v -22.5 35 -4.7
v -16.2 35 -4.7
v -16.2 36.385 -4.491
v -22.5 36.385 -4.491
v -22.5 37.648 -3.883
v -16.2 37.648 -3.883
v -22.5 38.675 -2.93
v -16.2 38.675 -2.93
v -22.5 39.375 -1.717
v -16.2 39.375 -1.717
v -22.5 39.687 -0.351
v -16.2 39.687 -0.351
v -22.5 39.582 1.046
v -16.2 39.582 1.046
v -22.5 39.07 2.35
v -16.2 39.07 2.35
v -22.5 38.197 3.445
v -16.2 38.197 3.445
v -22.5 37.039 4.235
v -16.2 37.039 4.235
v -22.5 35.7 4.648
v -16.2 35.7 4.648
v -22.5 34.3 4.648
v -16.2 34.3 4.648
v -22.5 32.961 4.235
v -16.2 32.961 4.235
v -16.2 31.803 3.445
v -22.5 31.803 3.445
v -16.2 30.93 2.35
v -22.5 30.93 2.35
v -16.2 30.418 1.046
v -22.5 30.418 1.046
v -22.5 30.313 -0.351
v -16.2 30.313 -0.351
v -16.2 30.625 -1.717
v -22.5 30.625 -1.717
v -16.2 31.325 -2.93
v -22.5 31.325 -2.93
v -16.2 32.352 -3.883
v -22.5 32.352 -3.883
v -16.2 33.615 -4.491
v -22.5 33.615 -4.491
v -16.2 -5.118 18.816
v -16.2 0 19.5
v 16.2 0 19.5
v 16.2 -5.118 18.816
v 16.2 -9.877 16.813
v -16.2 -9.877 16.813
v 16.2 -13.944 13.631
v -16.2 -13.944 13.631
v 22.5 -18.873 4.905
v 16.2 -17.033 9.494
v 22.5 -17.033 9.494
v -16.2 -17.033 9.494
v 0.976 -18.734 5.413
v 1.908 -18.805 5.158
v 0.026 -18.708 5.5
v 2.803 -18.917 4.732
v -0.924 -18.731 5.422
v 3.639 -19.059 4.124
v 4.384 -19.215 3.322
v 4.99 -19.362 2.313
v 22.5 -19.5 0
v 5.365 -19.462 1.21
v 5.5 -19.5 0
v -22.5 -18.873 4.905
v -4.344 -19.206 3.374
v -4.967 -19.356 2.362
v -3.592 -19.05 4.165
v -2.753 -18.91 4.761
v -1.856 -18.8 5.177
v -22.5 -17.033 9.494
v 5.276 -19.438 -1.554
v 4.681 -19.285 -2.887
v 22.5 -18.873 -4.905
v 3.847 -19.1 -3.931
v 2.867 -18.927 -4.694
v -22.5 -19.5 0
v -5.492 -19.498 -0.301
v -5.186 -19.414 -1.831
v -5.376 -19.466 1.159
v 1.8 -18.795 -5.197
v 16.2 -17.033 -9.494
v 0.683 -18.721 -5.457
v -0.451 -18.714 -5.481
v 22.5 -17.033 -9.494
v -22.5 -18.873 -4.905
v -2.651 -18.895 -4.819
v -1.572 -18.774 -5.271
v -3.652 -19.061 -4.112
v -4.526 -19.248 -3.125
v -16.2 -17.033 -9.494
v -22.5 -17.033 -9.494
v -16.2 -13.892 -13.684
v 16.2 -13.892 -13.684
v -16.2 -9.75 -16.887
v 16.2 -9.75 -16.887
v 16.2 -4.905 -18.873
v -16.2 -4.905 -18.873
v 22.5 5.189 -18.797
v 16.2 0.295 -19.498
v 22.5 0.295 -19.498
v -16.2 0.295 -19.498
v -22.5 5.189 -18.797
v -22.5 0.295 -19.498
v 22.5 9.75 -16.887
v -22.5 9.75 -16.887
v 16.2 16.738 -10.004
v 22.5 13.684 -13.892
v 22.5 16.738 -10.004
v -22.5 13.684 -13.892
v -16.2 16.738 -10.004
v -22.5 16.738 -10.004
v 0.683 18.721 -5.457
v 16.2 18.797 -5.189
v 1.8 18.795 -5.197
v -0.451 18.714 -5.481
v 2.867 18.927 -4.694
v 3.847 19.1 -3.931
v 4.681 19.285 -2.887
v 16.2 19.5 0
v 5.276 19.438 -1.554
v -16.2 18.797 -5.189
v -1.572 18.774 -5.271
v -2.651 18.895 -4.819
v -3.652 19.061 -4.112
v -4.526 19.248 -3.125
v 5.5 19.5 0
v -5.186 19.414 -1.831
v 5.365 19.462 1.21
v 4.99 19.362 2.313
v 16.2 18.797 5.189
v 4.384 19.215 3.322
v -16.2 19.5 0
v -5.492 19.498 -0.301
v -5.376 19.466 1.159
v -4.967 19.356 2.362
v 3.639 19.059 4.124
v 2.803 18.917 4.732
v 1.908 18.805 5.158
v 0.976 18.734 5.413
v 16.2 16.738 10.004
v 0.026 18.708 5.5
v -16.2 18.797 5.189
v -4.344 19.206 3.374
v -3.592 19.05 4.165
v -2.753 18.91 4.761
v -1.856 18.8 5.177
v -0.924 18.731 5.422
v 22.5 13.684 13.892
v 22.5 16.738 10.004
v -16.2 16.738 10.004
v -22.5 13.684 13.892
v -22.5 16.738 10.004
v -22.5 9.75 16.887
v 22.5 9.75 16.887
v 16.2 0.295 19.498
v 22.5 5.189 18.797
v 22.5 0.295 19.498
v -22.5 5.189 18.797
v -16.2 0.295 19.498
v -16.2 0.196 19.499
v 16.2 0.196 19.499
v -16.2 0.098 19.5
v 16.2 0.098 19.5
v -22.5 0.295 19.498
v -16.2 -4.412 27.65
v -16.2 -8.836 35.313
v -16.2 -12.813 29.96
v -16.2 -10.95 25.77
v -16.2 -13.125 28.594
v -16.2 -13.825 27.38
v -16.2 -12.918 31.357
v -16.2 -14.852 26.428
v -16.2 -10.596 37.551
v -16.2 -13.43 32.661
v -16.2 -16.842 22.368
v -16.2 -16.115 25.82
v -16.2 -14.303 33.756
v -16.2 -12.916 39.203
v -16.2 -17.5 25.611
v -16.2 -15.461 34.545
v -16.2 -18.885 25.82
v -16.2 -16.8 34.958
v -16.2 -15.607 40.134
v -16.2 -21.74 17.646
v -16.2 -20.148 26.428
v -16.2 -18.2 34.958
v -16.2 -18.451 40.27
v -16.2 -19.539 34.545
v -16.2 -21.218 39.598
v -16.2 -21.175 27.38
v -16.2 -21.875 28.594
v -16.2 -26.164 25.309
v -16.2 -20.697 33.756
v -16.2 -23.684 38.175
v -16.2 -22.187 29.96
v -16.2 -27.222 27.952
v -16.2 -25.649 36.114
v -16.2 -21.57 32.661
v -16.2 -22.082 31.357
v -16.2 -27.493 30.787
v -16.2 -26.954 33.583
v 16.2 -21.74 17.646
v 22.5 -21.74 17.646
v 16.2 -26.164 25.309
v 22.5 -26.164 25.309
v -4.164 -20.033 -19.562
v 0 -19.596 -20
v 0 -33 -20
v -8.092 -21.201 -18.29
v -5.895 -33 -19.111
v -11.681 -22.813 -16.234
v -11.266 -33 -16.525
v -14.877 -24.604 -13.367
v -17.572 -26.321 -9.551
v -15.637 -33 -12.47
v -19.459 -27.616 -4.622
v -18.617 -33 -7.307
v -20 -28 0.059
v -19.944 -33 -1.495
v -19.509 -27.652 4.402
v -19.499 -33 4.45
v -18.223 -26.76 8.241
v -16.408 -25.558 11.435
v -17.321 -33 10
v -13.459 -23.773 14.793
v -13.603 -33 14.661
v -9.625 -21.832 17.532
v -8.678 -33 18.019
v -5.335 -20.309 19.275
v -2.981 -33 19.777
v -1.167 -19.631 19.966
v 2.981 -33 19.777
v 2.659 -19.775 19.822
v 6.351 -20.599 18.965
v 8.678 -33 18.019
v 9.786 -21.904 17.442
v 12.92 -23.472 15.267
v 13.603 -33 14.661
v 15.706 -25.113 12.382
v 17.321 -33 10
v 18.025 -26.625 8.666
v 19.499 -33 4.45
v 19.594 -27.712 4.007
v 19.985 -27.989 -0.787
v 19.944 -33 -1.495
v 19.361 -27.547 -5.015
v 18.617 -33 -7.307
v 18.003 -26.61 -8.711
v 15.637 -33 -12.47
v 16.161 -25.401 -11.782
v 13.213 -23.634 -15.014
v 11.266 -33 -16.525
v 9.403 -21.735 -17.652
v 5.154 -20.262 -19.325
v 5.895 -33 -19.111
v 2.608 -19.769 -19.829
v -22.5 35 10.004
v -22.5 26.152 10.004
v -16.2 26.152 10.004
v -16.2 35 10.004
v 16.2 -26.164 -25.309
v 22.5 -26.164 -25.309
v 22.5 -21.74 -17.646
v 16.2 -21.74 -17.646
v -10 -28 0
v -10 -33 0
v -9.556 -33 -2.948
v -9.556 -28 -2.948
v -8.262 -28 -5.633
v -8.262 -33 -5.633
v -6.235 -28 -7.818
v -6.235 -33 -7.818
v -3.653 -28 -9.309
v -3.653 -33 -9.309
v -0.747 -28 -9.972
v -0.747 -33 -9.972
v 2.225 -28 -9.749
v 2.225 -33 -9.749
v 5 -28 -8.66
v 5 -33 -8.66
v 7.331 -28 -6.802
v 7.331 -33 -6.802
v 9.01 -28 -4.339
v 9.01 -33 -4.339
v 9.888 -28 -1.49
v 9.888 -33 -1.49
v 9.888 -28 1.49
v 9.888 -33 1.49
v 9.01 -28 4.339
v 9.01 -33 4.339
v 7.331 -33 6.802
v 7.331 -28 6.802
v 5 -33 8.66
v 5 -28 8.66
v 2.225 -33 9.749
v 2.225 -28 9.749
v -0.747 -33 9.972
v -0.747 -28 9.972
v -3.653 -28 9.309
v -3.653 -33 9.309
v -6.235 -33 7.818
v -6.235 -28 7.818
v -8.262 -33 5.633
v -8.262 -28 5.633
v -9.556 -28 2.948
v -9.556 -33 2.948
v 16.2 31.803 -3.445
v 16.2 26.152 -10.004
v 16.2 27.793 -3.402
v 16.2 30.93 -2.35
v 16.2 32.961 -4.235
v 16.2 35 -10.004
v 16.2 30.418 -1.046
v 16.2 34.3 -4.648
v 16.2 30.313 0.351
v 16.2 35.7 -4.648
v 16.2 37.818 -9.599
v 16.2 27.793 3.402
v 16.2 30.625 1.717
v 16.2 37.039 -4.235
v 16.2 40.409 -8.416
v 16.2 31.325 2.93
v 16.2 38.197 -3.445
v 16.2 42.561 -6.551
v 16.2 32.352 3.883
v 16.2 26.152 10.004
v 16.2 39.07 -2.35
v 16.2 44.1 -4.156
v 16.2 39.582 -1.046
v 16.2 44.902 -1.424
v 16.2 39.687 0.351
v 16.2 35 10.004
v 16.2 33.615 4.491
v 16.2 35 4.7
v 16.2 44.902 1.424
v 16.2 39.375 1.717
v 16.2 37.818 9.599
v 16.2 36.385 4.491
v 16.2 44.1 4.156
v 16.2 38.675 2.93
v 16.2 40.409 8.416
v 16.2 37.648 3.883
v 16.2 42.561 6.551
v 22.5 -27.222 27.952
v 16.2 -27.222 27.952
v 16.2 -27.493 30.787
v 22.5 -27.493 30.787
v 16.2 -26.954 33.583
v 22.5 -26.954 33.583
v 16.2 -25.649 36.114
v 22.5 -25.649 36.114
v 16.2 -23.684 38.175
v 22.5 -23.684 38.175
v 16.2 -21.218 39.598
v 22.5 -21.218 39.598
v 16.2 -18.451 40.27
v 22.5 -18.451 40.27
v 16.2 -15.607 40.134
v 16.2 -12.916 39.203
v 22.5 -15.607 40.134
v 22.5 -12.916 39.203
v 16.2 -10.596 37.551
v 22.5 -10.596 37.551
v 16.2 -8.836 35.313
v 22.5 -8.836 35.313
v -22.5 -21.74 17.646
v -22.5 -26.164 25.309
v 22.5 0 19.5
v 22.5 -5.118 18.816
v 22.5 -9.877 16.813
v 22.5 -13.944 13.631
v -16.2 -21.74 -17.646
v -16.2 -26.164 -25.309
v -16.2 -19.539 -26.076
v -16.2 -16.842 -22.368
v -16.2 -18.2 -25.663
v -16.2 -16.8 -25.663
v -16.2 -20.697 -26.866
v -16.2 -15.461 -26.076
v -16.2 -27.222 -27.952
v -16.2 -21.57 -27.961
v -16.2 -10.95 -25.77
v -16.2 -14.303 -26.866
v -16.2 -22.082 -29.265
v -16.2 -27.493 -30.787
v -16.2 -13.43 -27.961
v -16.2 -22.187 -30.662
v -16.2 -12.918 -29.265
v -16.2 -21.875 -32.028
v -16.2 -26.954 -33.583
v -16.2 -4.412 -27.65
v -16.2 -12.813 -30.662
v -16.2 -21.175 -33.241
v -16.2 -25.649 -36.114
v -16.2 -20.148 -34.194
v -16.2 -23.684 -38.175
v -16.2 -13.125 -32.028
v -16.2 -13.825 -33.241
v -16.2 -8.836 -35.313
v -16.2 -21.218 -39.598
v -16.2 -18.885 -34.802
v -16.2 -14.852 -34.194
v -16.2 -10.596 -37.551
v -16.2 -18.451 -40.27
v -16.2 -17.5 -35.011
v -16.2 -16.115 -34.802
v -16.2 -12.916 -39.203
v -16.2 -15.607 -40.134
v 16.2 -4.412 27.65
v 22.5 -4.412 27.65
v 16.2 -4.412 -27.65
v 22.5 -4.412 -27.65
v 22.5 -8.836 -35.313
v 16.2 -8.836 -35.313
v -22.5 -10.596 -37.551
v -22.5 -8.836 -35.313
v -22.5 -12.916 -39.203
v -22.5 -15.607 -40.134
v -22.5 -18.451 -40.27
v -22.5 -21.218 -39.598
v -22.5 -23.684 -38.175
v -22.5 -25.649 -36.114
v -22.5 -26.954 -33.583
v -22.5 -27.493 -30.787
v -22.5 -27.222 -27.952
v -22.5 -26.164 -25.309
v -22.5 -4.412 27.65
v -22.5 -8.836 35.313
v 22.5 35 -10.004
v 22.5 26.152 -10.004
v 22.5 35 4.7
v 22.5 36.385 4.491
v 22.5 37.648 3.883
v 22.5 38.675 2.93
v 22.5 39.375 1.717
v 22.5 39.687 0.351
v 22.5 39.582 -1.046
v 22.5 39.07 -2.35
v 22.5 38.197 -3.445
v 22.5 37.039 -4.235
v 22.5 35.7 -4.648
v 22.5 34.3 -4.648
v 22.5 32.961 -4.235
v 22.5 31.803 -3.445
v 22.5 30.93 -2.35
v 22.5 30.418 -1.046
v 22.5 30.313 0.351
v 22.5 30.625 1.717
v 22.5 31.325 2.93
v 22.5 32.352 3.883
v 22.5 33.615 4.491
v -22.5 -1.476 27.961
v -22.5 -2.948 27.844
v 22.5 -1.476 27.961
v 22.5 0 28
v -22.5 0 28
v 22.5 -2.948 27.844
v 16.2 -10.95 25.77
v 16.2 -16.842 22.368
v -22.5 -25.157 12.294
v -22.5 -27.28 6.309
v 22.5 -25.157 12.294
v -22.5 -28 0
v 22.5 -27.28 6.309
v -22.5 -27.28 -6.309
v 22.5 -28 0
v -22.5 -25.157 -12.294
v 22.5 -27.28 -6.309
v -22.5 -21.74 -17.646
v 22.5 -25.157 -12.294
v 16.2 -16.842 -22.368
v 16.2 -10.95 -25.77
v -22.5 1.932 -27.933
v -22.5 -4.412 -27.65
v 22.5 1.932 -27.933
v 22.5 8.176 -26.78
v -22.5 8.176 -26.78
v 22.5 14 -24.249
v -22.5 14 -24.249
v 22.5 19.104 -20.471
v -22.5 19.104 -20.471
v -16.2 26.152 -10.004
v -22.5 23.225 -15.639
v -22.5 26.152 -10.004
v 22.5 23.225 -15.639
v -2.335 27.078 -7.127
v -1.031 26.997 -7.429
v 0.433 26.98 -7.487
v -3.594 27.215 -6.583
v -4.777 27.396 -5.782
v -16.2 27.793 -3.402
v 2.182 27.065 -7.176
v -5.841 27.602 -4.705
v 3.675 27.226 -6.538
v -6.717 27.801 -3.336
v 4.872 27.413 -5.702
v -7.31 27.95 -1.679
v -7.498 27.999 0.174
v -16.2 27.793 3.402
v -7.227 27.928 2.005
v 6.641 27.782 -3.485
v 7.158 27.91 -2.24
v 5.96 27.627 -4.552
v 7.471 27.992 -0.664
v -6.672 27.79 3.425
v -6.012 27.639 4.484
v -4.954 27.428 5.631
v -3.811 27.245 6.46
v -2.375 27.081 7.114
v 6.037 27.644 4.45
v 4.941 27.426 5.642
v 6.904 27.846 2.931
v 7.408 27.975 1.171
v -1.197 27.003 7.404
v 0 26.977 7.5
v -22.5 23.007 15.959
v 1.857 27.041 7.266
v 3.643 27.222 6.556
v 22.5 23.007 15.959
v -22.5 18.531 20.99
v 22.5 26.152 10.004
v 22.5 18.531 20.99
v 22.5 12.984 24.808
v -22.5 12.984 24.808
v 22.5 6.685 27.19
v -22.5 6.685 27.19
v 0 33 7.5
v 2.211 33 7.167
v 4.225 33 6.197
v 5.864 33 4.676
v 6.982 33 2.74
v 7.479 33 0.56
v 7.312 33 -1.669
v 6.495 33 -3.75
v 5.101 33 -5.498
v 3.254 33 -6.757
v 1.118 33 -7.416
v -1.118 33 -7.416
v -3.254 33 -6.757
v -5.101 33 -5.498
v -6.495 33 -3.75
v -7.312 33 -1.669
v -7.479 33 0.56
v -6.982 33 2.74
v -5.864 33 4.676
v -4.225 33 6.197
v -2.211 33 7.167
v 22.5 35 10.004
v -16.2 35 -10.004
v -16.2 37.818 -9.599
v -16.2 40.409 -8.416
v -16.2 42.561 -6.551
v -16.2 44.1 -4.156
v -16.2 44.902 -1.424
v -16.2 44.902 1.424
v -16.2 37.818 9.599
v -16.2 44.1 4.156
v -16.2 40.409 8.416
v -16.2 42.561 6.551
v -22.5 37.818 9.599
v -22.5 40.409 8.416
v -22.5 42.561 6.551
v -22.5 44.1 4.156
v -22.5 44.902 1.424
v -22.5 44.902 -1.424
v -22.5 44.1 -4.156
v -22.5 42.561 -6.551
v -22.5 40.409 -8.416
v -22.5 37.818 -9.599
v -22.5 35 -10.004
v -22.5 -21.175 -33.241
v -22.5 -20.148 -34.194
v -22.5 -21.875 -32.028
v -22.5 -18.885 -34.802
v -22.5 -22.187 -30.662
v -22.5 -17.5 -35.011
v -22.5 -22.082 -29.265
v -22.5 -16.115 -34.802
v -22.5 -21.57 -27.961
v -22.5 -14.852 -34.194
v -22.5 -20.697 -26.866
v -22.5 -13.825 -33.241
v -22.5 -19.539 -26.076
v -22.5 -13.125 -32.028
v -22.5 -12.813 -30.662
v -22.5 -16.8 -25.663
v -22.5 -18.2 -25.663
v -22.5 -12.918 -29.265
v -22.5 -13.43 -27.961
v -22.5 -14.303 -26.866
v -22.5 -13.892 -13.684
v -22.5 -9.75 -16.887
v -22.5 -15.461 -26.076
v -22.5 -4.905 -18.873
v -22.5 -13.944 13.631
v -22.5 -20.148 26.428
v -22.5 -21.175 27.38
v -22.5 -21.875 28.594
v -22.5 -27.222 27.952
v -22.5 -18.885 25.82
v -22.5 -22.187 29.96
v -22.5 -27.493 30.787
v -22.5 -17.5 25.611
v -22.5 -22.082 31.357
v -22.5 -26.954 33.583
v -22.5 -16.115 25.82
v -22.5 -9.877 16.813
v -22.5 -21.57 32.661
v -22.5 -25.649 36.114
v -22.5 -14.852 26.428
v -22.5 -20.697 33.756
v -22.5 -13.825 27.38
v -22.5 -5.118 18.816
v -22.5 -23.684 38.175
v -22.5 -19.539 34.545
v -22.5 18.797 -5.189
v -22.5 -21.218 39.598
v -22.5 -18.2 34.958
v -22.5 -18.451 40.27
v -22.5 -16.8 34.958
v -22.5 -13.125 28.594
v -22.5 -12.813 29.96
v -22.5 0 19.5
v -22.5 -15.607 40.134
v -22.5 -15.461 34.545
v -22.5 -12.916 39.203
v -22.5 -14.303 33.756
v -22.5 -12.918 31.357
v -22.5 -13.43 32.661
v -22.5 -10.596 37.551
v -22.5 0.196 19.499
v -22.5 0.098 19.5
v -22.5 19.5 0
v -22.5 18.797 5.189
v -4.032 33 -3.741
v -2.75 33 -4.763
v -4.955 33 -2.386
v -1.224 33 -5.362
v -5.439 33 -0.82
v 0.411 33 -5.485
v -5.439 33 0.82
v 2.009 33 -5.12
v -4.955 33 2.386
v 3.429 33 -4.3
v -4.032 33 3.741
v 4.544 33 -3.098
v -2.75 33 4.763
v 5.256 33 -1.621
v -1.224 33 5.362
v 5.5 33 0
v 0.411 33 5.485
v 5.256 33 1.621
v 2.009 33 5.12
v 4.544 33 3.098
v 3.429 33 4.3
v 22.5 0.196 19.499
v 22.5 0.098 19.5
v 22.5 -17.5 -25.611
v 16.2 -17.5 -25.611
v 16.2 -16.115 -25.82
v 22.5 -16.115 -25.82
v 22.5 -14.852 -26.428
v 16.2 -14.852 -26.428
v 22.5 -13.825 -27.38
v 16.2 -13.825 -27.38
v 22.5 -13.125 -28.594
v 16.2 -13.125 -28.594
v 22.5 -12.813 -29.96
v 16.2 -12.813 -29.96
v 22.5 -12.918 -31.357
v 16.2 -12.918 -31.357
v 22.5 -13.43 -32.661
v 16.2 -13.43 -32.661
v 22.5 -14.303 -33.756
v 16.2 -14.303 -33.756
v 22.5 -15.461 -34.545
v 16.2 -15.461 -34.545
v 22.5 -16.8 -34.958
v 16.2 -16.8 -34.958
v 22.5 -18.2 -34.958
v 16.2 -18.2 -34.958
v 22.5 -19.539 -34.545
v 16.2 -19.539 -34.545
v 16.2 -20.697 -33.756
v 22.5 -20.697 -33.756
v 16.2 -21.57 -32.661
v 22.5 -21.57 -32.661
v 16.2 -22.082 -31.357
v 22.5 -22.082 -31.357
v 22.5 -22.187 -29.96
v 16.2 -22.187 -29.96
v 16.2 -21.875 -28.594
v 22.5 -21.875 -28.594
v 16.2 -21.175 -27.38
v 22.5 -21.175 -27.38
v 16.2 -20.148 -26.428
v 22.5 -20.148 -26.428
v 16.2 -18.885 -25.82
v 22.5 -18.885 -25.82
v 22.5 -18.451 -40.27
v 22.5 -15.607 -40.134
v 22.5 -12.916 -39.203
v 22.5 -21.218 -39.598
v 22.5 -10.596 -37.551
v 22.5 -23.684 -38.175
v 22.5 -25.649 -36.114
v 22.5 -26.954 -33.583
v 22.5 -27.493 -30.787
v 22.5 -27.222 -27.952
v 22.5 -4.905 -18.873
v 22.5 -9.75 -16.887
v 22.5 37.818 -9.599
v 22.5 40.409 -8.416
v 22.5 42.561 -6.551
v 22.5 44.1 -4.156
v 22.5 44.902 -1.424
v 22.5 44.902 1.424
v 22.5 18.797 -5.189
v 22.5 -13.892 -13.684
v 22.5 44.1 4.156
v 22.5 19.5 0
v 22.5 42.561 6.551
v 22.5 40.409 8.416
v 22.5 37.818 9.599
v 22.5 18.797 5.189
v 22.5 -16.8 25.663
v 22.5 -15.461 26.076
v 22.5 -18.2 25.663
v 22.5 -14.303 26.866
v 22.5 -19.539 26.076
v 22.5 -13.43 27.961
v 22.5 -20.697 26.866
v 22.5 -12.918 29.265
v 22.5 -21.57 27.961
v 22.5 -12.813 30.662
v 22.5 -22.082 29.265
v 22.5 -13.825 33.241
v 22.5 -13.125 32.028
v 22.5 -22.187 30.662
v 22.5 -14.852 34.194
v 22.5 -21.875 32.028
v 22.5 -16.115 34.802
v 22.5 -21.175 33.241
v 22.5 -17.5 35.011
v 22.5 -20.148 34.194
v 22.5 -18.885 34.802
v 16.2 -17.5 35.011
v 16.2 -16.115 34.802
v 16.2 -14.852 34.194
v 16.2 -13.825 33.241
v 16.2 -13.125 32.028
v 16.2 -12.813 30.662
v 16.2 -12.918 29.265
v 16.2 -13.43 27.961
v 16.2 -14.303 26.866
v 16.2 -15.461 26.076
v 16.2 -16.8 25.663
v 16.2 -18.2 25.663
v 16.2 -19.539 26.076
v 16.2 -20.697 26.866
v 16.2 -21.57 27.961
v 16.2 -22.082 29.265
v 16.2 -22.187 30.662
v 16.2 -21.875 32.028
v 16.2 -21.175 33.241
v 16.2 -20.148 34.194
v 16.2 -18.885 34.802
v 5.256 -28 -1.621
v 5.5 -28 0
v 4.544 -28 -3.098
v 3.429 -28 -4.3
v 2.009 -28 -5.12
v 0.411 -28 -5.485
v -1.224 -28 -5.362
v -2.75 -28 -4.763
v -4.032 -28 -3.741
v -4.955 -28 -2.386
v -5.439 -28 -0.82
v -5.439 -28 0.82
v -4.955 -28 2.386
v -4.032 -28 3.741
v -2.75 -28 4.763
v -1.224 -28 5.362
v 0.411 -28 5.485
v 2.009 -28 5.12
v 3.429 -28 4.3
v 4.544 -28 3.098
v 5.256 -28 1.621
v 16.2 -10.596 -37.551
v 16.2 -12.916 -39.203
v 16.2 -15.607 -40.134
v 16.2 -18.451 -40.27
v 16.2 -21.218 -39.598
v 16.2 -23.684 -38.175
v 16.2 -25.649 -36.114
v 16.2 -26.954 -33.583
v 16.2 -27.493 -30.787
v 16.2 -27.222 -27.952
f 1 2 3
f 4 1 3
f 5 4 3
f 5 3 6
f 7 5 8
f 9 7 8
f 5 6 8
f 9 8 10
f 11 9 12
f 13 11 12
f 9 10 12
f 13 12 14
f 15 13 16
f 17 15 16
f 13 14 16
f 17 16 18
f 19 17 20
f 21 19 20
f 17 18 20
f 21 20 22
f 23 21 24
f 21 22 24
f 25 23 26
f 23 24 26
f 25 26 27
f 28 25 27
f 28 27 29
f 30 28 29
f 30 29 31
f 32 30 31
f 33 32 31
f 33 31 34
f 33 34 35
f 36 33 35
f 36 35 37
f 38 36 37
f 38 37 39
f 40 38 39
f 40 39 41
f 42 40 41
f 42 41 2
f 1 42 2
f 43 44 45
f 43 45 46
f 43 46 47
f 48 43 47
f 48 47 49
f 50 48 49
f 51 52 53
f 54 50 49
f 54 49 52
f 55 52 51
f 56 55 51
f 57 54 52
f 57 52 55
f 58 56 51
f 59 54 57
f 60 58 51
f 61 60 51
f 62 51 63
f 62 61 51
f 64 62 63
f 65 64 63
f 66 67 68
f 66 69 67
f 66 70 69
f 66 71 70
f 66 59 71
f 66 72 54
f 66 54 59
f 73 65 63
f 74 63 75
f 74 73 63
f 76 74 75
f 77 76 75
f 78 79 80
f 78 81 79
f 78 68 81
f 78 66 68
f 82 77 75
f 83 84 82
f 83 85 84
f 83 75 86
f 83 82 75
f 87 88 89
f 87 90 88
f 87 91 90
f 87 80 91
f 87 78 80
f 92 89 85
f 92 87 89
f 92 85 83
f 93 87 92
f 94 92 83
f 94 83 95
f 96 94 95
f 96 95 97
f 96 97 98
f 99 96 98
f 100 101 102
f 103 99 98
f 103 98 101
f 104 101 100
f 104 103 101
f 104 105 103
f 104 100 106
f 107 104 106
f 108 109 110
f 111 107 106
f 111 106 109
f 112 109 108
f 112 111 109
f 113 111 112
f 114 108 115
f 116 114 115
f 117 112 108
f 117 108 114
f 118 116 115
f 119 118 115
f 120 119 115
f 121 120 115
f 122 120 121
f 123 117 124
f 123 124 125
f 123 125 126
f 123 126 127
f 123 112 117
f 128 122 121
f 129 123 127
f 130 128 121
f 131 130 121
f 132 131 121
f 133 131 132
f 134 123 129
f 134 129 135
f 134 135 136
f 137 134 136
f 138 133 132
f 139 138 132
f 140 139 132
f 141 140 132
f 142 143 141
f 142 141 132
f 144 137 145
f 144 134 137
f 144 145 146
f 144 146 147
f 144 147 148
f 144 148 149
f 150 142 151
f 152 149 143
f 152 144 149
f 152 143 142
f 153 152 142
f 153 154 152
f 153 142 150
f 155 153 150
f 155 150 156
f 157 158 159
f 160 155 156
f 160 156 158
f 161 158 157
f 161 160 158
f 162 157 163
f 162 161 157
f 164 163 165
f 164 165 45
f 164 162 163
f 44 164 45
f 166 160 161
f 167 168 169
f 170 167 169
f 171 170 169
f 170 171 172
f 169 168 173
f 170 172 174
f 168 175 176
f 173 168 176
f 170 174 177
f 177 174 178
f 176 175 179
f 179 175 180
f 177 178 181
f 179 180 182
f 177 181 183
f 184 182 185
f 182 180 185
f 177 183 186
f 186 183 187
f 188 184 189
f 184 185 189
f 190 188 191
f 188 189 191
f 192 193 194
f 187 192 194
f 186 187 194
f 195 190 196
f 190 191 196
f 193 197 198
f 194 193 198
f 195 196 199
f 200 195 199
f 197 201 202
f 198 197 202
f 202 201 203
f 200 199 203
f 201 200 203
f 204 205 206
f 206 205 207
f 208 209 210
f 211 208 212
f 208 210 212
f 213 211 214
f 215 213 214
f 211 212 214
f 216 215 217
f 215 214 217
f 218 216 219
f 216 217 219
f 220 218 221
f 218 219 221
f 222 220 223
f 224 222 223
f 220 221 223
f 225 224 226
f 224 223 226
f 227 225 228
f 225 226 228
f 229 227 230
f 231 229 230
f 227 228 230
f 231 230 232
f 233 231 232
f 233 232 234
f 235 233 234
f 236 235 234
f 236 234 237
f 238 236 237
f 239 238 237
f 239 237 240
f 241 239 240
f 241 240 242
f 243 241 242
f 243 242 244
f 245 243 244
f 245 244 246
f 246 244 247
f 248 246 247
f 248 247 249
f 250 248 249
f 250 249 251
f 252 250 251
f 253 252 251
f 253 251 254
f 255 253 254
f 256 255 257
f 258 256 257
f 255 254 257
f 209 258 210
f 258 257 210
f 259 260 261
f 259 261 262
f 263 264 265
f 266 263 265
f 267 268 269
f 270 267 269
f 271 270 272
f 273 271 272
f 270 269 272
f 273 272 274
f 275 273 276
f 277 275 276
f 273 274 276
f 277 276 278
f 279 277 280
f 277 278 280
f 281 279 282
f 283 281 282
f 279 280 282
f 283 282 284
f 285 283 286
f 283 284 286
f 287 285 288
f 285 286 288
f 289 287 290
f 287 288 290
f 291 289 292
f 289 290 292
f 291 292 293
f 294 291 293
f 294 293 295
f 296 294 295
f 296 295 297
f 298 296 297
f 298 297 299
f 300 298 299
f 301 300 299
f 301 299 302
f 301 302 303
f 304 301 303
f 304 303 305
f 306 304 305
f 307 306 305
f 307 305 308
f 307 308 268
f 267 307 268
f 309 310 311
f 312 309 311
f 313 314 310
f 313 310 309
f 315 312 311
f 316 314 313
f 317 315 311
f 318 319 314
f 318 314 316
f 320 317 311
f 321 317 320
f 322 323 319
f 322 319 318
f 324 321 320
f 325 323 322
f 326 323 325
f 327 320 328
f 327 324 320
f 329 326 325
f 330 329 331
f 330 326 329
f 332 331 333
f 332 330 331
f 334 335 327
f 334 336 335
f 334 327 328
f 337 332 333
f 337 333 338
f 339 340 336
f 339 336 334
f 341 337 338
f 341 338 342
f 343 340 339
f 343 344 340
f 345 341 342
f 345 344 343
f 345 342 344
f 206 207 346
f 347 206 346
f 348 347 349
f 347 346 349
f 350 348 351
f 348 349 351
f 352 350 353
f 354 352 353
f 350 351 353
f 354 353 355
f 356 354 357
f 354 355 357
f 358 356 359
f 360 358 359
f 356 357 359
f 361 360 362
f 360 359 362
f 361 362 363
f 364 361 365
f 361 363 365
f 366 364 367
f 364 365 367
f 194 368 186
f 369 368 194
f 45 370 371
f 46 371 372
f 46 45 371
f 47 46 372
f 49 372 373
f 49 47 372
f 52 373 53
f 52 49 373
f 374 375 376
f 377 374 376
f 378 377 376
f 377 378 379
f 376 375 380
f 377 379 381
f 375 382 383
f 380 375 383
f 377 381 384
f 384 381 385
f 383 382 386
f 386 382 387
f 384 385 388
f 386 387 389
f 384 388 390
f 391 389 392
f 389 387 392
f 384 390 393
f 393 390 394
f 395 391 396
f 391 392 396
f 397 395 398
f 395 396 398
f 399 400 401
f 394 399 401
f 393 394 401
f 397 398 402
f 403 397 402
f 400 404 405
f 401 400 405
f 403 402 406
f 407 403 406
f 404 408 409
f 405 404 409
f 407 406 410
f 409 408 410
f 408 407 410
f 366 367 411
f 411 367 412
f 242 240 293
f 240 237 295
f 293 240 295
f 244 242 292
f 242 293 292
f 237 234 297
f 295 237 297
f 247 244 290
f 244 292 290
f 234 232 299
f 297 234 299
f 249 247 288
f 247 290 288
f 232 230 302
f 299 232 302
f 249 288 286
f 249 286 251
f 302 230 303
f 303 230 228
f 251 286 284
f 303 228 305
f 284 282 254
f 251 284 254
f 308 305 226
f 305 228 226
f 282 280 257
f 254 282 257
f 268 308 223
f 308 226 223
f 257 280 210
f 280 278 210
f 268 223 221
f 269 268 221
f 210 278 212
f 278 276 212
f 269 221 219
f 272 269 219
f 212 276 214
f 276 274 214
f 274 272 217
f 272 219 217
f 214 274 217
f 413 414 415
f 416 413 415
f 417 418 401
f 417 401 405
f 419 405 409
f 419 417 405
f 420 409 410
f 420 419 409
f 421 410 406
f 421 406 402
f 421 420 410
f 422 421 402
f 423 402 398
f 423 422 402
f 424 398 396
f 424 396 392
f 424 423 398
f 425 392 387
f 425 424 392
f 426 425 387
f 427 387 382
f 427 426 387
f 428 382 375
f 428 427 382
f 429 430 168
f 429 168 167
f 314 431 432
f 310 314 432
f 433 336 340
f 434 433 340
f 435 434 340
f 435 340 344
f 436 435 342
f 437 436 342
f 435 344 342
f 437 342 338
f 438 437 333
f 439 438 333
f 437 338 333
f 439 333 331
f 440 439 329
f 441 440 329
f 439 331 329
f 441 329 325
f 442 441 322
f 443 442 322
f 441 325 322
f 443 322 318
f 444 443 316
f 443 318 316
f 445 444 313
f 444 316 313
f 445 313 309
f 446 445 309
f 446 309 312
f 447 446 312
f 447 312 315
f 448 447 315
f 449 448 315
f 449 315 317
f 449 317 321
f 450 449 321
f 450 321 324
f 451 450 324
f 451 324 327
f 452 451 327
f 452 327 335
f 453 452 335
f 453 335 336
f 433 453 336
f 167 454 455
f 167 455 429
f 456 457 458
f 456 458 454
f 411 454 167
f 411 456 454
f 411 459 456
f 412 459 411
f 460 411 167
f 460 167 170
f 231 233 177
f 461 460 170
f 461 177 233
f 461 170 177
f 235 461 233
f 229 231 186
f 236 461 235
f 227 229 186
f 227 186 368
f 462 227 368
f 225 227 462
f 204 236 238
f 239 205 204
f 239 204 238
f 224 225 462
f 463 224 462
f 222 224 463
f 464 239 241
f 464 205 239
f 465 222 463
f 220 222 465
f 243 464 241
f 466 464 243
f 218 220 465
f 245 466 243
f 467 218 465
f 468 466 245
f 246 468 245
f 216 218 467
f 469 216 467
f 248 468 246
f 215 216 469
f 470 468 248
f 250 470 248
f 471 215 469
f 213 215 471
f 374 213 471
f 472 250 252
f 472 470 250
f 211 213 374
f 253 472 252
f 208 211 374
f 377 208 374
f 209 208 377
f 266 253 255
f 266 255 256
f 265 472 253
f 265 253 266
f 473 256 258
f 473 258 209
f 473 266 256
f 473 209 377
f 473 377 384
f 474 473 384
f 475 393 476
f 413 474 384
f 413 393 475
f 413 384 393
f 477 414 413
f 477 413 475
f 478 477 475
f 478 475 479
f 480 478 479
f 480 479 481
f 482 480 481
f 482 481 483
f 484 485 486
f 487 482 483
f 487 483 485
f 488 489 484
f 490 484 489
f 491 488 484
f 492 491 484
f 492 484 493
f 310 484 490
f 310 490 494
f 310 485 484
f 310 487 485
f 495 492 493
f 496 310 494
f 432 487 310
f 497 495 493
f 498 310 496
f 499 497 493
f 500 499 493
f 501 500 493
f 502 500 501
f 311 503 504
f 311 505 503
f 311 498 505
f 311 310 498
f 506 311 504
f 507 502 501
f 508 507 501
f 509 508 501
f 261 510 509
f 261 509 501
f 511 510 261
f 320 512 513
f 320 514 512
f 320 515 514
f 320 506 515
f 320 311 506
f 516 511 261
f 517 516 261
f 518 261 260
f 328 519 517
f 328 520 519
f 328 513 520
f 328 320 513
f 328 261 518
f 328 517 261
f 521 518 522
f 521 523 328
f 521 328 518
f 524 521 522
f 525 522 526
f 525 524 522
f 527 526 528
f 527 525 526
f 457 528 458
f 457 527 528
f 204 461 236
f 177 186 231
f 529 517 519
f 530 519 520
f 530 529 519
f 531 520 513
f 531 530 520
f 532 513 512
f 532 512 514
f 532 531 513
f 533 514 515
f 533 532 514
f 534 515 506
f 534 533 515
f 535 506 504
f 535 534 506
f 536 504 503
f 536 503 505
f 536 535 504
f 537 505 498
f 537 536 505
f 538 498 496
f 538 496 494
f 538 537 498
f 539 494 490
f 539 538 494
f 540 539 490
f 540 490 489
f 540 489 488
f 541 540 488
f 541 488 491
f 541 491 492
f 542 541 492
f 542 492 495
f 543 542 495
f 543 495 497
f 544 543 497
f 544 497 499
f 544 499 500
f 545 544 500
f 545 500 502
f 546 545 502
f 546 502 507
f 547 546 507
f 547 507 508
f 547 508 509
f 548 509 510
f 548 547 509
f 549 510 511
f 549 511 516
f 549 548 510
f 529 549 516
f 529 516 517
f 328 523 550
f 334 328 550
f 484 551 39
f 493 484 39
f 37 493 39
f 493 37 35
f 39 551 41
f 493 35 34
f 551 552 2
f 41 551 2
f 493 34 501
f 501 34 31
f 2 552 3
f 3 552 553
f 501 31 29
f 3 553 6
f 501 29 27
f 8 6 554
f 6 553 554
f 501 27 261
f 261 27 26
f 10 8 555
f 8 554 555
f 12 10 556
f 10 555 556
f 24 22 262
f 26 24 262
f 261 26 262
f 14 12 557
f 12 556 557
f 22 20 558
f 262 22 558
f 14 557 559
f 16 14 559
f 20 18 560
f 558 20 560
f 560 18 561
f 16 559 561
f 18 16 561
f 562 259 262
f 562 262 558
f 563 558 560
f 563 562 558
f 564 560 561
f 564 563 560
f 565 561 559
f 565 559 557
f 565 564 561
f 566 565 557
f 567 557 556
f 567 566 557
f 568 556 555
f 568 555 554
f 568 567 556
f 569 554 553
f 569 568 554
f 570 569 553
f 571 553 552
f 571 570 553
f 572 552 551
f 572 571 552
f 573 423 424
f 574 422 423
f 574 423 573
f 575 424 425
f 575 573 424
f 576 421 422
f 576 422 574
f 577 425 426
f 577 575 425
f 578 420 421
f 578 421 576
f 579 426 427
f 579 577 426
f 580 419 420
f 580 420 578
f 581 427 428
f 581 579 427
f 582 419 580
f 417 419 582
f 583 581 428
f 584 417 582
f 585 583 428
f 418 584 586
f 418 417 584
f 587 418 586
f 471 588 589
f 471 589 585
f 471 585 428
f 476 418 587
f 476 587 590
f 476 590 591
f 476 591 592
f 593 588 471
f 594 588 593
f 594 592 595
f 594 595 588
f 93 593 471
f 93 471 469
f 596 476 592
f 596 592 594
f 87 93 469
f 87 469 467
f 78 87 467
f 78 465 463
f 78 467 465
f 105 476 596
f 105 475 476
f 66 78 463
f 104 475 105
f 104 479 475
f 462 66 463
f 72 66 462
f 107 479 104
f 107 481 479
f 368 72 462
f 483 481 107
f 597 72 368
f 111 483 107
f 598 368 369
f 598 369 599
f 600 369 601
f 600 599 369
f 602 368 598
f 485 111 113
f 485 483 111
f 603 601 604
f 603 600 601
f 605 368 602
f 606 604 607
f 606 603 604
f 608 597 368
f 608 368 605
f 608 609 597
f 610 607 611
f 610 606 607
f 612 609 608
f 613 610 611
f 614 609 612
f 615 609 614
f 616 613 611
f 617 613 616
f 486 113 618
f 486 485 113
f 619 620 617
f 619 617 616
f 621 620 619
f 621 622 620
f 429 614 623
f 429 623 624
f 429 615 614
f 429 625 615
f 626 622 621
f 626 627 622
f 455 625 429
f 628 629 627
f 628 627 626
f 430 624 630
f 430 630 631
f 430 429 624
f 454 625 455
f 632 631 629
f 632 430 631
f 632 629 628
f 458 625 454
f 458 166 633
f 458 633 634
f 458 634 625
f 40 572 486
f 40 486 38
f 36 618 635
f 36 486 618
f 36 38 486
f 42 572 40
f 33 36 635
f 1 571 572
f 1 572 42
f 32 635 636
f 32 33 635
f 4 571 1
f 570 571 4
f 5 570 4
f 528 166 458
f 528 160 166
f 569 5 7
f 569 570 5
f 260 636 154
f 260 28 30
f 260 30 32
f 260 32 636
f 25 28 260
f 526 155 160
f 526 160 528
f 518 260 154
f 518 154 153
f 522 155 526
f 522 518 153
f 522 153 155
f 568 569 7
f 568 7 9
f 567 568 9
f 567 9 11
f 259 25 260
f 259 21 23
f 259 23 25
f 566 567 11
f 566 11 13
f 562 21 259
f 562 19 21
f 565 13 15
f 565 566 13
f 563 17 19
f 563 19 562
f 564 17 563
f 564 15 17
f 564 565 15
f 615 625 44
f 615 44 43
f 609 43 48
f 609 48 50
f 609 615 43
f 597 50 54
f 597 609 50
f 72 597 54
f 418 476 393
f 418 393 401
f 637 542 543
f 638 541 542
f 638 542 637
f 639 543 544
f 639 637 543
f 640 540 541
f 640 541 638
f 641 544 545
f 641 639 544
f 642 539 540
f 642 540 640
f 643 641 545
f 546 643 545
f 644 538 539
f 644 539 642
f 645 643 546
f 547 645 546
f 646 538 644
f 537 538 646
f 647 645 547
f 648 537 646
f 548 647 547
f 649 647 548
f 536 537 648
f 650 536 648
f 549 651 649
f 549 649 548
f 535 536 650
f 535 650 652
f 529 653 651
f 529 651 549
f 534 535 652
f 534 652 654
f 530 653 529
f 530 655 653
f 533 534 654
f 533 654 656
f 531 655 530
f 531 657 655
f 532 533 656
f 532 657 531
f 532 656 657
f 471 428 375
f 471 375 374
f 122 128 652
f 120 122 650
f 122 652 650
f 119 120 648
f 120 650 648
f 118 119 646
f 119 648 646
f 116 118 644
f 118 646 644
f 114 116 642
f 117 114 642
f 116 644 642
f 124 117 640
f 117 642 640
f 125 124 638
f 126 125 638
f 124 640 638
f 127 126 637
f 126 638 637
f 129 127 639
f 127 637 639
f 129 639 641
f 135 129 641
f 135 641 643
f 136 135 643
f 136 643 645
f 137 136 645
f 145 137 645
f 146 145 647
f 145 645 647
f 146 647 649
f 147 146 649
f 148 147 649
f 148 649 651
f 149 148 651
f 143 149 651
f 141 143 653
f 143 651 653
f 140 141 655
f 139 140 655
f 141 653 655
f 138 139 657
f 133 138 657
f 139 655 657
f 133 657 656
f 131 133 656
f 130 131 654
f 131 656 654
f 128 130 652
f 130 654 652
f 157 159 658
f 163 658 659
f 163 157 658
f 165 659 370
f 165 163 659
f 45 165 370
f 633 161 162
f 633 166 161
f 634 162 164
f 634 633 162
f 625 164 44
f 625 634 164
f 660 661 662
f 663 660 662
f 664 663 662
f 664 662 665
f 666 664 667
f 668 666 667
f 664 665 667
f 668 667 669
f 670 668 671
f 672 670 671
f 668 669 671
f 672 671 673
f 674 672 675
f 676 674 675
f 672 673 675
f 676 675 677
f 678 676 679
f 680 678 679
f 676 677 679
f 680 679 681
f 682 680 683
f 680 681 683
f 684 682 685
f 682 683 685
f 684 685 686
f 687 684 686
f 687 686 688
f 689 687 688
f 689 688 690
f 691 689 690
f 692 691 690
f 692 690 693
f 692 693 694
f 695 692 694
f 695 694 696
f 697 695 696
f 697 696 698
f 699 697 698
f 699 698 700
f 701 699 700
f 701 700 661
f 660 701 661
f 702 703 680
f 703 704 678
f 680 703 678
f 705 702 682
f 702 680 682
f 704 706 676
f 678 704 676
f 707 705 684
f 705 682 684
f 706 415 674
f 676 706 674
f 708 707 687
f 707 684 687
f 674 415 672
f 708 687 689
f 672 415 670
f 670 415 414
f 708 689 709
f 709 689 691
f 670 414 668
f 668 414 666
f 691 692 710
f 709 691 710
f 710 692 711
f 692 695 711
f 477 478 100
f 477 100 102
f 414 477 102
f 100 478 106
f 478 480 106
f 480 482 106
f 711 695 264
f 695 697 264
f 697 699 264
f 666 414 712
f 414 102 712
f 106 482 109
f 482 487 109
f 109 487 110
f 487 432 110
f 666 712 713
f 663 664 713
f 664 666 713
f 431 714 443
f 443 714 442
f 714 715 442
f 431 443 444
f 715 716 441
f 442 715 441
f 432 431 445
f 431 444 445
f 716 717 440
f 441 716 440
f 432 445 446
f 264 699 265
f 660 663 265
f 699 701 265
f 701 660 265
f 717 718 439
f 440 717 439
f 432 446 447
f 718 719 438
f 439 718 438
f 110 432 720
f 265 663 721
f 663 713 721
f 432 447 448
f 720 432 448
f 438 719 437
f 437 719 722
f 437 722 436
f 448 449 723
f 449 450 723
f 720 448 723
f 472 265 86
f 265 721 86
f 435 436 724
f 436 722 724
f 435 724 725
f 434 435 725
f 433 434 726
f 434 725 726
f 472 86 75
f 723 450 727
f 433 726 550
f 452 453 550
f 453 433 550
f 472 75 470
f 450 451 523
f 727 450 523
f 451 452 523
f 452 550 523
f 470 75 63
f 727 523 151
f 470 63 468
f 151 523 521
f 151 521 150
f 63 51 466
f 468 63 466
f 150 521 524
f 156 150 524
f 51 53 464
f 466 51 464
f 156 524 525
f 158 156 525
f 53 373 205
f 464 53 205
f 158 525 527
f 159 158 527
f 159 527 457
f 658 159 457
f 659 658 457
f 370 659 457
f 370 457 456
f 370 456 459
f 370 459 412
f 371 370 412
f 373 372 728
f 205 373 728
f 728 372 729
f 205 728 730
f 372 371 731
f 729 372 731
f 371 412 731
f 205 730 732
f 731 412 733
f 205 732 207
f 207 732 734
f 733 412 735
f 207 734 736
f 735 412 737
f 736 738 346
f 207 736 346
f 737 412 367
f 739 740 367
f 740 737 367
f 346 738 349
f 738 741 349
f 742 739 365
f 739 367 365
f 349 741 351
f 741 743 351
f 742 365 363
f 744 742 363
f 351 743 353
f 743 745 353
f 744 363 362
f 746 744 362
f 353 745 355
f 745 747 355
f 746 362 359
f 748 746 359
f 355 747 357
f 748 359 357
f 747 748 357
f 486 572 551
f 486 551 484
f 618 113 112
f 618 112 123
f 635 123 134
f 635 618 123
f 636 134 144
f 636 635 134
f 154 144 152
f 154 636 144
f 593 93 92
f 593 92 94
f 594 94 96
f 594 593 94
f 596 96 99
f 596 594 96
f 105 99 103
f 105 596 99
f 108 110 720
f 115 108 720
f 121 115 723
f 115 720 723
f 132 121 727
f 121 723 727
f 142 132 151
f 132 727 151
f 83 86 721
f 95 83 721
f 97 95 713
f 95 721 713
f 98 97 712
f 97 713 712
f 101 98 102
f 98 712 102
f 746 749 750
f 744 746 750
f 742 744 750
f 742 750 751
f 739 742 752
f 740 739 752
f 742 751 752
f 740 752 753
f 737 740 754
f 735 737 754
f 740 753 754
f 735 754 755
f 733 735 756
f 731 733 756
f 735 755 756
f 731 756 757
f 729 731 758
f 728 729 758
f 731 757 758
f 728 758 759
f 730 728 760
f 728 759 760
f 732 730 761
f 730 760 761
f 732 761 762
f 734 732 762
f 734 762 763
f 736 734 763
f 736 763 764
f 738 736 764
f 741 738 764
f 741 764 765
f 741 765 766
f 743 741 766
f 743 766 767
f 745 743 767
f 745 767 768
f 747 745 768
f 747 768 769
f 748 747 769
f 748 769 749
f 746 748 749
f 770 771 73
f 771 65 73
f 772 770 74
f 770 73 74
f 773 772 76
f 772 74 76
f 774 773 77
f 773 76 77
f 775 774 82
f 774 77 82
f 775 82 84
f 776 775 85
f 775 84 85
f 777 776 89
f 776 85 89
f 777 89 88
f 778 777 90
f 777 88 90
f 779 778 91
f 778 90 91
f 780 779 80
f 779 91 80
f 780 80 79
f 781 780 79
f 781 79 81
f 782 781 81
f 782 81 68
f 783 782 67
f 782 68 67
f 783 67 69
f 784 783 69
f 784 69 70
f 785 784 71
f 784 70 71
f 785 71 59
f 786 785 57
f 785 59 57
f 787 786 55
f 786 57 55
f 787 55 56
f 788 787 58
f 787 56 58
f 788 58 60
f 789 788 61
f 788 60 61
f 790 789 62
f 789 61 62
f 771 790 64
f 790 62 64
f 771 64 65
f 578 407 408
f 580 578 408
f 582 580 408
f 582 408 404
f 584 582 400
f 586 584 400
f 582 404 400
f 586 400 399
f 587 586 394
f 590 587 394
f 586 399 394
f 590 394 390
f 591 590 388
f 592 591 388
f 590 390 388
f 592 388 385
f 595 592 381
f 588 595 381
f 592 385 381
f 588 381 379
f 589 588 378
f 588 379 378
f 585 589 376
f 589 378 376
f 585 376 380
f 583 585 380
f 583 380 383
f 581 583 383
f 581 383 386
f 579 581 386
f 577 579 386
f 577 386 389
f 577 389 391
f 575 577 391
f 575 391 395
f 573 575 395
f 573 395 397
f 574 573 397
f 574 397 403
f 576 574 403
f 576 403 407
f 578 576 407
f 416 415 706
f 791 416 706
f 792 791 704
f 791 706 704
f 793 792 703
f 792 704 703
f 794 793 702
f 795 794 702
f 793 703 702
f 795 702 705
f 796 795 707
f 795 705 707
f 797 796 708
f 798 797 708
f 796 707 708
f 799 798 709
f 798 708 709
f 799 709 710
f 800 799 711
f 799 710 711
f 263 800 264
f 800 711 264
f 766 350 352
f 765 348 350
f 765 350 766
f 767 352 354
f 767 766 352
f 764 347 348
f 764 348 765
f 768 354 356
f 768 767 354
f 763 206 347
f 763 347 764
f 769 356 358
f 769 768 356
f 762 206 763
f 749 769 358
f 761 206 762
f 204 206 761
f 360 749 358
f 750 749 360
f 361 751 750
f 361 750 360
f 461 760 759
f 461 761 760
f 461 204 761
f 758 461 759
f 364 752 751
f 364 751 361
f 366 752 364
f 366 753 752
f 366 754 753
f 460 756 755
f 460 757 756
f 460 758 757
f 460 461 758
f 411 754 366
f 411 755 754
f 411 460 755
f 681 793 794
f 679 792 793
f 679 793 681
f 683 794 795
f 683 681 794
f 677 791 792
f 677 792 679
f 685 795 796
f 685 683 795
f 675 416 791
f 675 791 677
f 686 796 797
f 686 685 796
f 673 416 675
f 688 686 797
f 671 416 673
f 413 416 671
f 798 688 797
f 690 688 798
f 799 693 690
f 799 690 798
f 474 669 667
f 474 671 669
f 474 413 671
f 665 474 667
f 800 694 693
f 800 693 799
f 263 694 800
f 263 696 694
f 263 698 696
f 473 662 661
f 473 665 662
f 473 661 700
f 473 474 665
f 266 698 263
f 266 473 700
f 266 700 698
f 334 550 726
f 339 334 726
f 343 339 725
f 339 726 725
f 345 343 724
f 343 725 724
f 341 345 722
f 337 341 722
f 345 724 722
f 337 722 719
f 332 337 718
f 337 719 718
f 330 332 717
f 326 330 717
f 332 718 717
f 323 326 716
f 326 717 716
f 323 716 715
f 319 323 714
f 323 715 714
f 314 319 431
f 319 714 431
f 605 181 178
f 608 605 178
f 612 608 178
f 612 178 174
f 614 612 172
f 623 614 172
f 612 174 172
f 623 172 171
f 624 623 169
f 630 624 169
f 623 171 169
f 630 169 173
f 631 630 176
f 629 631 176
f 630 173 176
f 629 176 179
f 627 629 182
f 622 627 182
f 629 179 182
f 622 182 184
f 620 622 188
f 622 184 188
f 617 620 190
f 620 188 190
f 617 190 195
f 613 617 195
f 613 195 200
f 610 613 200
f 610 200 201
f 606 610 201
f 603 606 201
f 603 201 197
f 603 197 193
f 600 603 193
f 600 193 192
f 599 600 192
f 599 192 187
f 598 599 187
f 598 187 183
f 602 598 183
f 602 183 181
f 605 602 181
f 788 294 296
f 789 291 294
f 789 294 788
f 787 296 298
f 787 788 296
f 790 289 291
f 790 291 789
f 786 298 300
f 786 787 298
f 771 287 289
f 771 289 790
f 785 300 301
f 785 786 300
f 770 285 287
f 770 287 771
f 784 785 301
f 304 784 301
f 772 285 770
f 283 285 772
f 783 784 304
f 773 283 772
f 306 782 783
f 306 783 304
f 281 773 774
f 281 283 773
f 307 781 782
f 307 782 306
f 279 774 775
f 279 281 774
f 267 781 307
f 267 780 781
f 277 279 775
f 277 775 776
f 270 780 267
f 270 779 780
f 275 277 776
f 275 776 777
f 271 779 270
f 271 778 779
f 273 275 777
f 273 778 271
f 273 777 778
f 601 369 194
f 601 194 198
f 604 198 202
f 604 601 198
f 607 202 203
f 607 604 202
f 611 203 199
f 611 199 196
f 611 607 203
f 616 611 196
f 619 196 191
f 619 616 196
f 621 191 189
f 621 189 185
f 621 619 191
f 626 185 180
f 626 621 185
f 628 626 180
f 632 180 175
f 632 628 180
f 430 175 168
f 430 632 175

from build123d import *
from build123d.topology import SkipClean

# Parameters (mm, degrees)
SKETCH1_R                = 28
SKETCH1_R_2              = 19.5
BOSS_EXTRUDE1_DEPTH      = 22.5
BOSS_EXTRUDE2_REACH      = 72.79
BOSS_EXTRUDE2_END_RADIUS = 28
SKETCH2_R                = 7.5
BOSS_EXTRUDE3_REACH      = 77.142
BOSS_EXTRUDE3_END_RADIUS = 28
SKETCH3_R                = 20
HOLE1_D                  = 11
HOLE1_CBORE_D            = 20
HOLE1_CBORE_DEPTH        = 5
BOSS_EXTRUDE4_DEPTH      = 6.3
CIRPATTERN2_COUNT        = 3
MIRROR3_COPY_1_DEPTH     = 6.3
MIRROR3_COPY_2_DEPTH     = 6.3
HOLE4_D                  = 9.4
HOLE4_DEPTH              = 6.3
HOLE5_D                  = 9.4
HOLE5_DEPTH              = 6.3


with BuildPart() as part:
    # Sketch1 → Boss-Extrude1 (new, symmetric)
    with BuildSketch(Plane(origin=(0, 0, 0), x_dir=(0, 0, -1), z_dir=(1, 0, 0))):
        with Locations(Location((0, 0, 0), (0, 0, 180))):
            Circle(SKETCH1_R)
        with Locations(Location((0, 0, 0), (0, 0, 180))):
            Circle(SKETCH1_R_2, mode=Mode.SUBTRACT)
    extrude(amount=BOSS_EXTRUDE1_DEPTH, both=True)

    # Boss-Extrude2: up to this cylinder (the profile starts outside it)
    boss_extrude2_end = Plane(origin=(0, 0, 0), z_dir=(-1, 0, 0)) * Cylinder(BOSS_EXTRUDE2_END_RADIUS, 202.58, mode=Mode.PRIVATE)
    # Sketch2 → Boss-Extrude2 (add, up to the surface)
    with BuildSketch(Plane(origin=(0, 33, 0), x_dir=(1, 0, 0), z_dir=(0, 1, 0)), mode=Mode.PRIVATE) as boss_extrude2_sk1:
        with Locations(Location((0, 0, 0), (0, 0, 270))):
            Circle(SKETCH2_R)
    boss_extrude2_tool1 = extrude(boss_extrude2_sk1.sketch, amount=-BOSS_EXTRUDE2_REACH, mode=Mode.PRIVATE) - boss_extrude2_end
    add(boss_extrude2_tool1.solids().sort_by_distance((0, 33, 0))[0])

    # Boss-Extrude3: up to this cylinder (the profile starts outside it)
    boss_extrude3_end = Plane(origin=(0, 0, 0), z_dir=(-1, 0, 0)) * Cylinder(BOSS_EXTRUDE3_END_RADIUS, 211.284, mode=Mode.PRIVATE)
    # Sketch3 → Boss-Extrude3 (add, up to the surface)
    with BuildSketch(Plane(origin=(0, -33, 0), x_dir=(1, 0, 0), z_dir=(0, 1, 0)), mode=Mode.PRIVATE) as boss_extrude3_sk1:
        with Locations(Location((0, 0, 0), (0, 0, 90))):
            Circle(SKETCH3_R)
    boss_extrude3_tool1 = extrude(boss_extrude3_sk1.sketch, amount=BOSS_EXTRUDE3_REACH, mode=Mode.PRIVATE) - boss_extrude3_end
    add(boss_extrude3_tool1.solids().sort_by_distance((0, -33, 0))[0])

    # Hole1 (through all)
    with Locations(Plane(origin=(0, -33, 0), x_dir=(-1, 0, 0), z_dir=(0, -1, 0))):
        with Locations((0, 0)):
            CounterBoreHole(HOLE1_D / 2, HOLE1_CBORE_D / 2, HOLE1_CBORE_DEPTH)

    # Sketch6 → Boss-Extrude4 (add)
    with BuildSketch(Plane.ZY.offset(22.5)):
        with BuildLine():
            Line((-10.004005993, 35), (-10.004005993, 16.738275422))
            ThreePointArc((-10.004005993, 16.738275422), (0, 19.5), (10.004005993, 16.738275422))
            Line((10.004005993, 16.738275422), (10.004005993, 35))
            ThreePointArc((10.004005993, 35), (0, 45.004005993), (-10.004005993, 35))
        make_face()
    boss_extrude4 = extrude(amount=-BOSS_EXTRUDE4_DEPTH)

    # CirPattern2: Boss-Extrude4 ×3 about axis
    with SkipClean():  # the faces are left unmerged after this step: merging them gives an invalid solid
        cirpattern2_axis = Axis((0, 0, 0), (1, 0, 0))
        for i in range(1, CIRPATTERN2_COUNT):
            add(boss_extrude4.rotate(cirpattern2_axis, i * 360 / CIRPATTERN2_COUNT))

    # Mirror3: Boss-Extrude4 across plane
    add(boss_extrude4.mirror(Plane(origin=(0, 0, 0), x_dir=(0, 0, 1), z_dir=(1, 0, 0))))

    # Mirror3 copy 1 sketch → Mirror3 copy 1 (add)
    with SkipClean():  # the faces are left unmerged after this step: merging them gives an invalid solid
        with BuildSketch(Plane(origin=(22.5, 0, 0), x_dir=(0, -0.8660254037844387, -0.4999999999999998), z_dir=(1, 0, 0))):
            with BuildLine():
                Line((-10.004005993, -35), (-10.004005993, -16.738275422))
                ThreePointArc((-10.004005993, -16.738275422), (0, -19.5), (10.004005993, -16.738275422))
                Line((10.004005993, -16.738275422), (10.004005993, -35))
                ThreePointArc((10.004005993, -35), (0, -45.004005993), (-10.004005993, -35))
            make_face()
        extrude(amount=-MIRROR3_COPY_1_DEPTH)

    # Mirror3 copy 2 sketch → Mirror3 copy 2 (add)
    with SkipClean():  # the faces are left unmerged after this step: merging them gives an invalid solid
        with BuildSketch(Plane(origin=(22.5, 0, 0), x_dir=(0, 0.8660254037844384, -0.5000000000000004), z_dir=(1, 0, 0))):
            with BuildLine():
                Line((-10.004005993, -35), (-10.004005993, -16.738275422))
                ThreePointArc((-10.004005993, -16.738275422), (0, -19.5), (10.004005993, -16.738275422))
                Line((10.004005993, -16.738275422), (10.004005993, -35))
                ThreePointArc((10.004005993, -35), (0, -45.004005993), (-10.004005993, -35))
            make_face()
        extrude(amount=-MIRROR3_COPY_2_DEPTH)
    add(part.part.scale(1), mode=Mode.REPLACE)  # the faces are merged on a copy

    # Hole4
    with Locations(Plane.ZY.offset(22.5)):
        with Locations((30.310889132, -17.5), (0, 35), (-30.310889132, -17.5)):
            Hole(HOLE4_D / 2, depth=HOLE4_DEPTH)

    # Hole5
    with Locations(Plane(origin=(22.5, 0, 0), x_dir=(0, 0, -1), z_dir=(1, 0, 0))):
        with Locations((0, 35), (30.310889132, -17.5), (-30.310889132, -17.5)):
            Hole(HOLE5_D / 2, depth=HOLE5_DEPTH)


solid = part.part
